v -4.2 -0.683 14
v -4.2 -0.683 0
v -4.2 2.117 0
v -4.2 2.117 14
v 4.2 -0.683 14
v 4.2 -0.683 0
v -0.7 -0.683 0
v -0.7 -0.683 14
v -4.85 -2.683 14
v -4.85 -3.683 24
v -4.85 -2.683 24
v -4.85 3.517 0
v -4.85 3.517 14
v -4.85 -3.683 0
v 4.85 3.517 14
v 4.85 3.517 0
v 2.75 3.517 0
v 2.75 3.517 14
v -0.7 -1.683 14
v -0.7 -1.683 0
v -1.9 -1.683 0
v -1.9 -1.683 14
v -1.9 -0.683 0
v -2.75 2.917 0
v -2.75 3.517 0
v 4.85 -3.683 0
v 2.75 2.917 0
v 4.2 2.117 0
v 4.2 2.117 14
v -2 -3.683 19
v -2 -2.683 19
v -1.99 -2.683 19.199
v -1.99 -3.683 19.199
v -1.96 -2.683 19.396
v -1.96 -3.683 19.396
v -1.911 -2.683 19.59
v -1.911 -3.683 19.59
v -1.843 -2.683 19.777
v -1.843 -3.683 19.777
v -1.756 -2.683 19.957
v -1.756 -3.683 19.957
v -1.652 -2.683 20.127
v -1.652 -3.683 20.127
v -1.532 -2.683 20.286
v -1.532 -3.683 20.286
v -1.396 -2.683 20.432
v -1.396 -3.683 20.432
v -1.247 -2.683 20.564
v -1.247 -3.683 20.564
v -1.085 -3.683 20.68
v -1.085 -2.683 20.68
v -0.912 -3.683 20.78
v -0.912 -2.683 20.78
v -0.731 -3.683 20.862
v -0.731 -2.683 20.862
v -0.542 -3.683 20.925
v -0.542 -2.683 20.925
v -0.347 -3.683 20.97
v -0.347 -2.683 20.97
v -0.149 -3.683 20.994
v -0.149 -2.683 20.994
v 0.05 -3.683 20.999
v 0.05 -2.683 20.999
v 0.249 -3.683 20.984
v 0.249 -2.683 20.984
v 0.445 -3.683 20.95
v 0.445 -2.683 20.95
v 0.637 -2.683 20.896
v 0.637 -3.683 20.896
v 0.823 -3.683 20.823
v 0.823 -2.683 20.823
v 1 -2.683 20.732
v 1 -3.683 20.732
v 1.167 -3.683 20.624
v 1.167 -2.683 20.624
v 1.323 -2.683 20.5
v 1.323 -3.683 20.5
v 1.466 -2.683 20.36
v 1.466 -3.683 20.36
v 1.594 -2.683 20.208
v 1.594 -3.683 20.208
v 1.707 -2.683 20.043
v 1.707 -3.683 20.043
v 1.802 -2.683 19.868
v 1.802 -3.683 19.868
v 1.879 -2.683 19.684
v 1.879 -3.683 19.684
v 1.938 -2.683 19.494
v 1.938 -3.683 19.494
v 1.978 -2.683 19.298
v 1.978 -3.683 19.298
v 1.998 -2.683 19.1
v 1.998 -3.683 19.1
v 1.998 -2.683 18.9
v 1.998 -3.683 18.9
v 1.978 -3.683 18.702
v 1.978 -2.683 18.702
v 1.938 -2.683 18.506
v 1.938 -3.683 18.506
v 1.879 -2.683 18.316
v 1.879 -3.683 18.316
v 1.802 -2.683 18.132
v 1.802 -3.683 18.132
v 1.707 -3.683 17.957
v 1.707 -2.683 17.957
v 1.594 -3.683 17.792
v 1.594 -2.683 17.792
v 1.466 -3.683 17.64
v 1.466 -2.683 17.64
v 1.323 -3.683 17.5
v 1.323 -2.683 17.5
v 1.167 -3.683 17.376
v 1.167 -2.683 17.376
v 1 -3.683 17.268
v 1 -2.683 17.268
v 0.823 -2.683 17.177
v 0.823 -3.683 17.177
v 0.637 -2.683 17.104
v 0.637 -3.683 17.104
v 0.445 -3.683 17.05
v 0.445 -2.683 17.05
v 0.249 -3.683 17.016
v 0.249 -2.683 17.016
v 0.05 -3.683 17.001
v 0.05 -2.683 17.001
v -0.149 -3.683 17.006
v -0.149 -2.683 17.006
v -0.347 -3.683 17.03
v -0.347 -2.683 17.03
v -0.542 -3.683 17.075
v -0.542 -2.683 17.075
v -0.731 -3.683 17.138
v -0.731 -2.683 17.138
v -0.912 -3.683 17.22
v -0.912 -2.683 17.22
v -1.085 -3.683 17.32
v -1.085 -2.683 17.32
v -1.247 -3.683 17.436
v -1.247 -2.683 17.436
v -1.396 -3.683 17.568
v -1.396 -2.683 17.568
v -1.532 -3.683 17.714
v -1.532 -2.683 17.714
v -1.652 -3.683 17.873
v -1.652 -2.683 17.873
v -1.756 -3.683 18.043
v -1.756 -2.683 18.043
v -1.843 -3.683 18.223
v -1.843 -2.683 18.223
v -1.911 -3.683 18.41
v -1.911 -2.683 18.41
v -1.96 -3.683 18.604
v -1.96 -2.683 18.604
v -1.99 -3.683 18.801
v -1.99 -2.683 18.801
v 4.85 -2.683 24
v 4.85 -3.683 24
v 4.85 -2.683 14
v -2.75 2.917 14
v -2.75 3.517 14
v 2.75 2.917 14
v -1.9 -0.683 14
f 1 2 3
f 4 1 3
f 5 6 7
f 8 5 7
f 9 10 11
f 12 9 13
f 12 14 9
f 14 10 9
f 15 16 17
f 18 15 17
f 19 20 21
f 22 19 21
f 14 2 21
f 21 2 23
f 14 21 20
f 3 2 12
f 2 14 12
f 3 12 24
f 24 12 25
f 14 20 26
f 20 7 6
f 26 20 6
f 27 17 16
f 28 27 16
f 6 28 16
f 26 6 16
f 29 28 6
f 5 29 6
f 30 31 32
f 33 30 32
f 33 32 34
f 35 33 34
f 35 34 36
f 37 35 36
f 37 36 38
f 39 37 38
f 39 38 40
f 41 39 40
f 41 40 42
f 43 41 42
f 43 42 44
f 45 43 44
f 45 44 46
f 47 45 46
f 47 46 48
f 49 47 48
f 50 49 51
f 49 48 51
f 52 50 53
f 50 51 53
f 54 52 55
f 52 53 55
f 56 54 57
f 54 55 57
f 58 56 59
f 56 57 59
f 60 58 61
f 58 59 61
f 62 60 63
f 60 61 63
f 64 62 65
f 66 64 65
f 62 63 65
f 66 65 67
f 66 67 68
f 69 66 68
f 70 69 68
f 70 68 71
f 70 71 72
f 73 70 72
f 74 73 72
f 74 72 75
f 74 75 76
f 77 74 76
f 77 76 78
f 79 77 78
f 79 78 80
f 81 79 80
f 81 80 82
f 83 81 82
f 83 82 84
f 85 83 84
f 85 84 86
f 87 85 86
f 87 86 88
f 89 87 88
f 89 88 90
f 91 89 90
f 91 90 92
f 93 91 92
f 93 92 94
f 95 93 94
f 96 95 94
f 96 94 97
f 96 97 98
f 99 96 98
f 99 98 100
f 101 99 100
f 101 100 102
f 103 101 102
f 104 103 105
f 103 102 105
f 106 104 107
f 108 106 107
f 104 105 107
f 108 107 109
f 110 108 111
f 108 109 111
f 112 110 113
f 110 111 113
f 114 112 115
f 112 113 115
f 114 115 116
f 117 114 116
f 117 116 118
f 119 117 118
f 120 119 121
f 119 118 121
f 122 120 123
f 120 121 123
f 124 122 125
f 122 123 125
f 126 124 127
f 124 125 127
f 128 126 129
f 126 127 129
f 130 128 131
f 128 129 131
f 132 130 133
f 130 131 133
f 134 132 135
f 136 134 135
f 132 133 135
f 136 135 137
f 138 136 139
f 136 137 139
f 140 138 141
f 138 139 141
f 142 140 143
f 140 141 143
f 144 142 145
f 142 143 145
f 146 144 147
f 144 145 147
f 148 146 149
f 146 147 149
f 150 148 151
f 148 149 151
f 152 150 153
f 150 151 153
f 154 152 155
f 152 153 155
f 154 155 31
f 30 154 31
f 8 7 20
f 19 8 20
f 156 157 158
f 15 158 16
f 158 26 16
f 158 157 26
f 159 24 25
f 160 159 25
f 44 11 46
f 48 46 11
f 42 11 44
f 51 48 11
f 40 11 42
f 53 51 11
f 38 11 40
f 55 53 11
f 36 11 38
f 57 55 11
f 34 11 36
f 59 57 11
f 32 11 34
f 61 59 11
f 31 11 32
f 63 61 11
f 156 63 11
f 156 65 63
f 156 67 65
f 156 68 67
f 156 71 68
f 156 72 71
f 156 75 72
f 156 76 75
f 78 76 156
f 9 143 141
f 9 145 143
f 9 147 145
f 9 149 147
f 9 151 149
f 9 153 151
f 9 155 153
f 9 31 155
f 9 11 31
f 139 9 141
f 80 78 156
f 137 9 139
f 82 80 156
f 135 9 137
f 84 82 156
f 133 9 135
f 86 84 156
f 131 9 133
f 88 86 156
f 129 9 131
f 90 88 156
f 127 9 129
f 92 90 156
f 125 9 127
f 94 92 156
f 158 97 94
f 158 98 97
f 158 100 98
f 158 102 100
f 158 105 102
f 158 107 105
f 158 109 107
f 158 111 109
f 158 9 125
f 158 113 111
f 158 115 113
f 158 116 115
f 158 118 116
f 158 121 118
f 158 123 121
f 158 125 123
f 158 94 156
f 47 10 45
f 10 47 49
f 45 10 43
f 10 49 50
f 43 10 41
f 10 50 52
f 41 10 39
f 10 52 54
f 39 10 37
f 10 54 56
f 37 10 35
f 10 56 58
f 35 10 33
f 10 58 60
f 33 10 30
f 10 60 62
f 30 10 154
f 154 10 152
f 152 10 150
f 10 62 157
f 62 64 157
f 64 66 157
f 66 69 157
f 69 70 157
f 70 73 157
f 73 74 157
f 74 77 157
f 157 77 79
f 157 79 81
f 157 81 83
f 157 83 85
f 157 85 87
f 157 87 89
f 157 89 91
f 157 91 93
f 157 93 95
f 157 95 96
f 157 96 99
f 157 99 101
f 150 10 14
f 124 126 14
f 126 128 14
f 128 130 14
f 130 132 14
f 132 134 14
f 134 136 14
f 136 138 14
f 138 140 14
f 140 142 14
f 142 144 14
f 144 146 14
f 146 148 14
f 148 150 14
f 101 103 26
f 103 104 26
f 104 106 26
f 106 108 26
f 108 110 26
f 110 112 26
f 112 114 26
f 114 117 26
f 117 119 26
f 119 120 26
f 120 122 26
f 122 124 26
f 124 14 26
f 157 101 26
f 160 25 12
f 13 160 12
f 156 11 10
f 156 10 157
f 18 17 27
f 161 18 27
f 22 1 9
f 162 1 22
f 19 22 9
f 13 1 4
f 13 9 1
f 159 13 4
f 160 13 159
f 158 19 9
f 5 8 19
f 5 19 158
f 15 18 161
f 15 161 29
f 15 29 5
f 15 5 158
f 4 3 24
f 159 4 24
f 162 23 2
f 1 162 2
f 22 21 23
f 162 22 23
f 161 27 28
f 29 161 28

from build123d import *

# Parameters (mm, degrees)
PAD_DEPTH    = 14
SKETCH001_W  = 9.7
SKETCH001_H  = 1
PAD001_DEPTH = 10
SKETCH002_R  = 2
POCKET_DEPTH = 5


with BuildPart() as part:
    # Sketch → Pad (new body)
    with BuildSketch(Plane.XY):
        Polygon((-2.75, 3.516621), (-4.85, 3.516621), (-4.85, -3.683379), (4.85, -3.683379), (4.85, 3.516621), (2.75, 3.516621), (2.75, 2.916621), (4.2, 2.116621), (4.2, -0.683379), (-0.7, -0.683379), (-0.7, -1.683379), (-1.9, -1.683379), (-1.9, -0.683379), (-4.2, -0.683379), (-4.2, 2.116621), (-2.75, 2.916621), align=None)
    extrude(amount=PAD_DEPTH)

    # Sketch001 → Pad001 (new body)
    with BuildSketch(Plane.XY.offset(14)):
        with Locations((0, -3.183379)):
            Rectangle(SKETCH001_W, SKETCH001_H)
    extrude(amount=PAD001_DEPTH)

    # Sketch002 → Pocket (cut)
    with BuildSketch(Plane(origin=(0, -2.683379, 0), x_dir=(-1, 0, 0), z_dir=(0, 1, 0))):
        with Locations((0, 19)):
            Circle(SKETCH002_R)
    extrude(amount=-POCKET_DEPTH, mode=Mode.SUBTRACT)


solid = part.part
